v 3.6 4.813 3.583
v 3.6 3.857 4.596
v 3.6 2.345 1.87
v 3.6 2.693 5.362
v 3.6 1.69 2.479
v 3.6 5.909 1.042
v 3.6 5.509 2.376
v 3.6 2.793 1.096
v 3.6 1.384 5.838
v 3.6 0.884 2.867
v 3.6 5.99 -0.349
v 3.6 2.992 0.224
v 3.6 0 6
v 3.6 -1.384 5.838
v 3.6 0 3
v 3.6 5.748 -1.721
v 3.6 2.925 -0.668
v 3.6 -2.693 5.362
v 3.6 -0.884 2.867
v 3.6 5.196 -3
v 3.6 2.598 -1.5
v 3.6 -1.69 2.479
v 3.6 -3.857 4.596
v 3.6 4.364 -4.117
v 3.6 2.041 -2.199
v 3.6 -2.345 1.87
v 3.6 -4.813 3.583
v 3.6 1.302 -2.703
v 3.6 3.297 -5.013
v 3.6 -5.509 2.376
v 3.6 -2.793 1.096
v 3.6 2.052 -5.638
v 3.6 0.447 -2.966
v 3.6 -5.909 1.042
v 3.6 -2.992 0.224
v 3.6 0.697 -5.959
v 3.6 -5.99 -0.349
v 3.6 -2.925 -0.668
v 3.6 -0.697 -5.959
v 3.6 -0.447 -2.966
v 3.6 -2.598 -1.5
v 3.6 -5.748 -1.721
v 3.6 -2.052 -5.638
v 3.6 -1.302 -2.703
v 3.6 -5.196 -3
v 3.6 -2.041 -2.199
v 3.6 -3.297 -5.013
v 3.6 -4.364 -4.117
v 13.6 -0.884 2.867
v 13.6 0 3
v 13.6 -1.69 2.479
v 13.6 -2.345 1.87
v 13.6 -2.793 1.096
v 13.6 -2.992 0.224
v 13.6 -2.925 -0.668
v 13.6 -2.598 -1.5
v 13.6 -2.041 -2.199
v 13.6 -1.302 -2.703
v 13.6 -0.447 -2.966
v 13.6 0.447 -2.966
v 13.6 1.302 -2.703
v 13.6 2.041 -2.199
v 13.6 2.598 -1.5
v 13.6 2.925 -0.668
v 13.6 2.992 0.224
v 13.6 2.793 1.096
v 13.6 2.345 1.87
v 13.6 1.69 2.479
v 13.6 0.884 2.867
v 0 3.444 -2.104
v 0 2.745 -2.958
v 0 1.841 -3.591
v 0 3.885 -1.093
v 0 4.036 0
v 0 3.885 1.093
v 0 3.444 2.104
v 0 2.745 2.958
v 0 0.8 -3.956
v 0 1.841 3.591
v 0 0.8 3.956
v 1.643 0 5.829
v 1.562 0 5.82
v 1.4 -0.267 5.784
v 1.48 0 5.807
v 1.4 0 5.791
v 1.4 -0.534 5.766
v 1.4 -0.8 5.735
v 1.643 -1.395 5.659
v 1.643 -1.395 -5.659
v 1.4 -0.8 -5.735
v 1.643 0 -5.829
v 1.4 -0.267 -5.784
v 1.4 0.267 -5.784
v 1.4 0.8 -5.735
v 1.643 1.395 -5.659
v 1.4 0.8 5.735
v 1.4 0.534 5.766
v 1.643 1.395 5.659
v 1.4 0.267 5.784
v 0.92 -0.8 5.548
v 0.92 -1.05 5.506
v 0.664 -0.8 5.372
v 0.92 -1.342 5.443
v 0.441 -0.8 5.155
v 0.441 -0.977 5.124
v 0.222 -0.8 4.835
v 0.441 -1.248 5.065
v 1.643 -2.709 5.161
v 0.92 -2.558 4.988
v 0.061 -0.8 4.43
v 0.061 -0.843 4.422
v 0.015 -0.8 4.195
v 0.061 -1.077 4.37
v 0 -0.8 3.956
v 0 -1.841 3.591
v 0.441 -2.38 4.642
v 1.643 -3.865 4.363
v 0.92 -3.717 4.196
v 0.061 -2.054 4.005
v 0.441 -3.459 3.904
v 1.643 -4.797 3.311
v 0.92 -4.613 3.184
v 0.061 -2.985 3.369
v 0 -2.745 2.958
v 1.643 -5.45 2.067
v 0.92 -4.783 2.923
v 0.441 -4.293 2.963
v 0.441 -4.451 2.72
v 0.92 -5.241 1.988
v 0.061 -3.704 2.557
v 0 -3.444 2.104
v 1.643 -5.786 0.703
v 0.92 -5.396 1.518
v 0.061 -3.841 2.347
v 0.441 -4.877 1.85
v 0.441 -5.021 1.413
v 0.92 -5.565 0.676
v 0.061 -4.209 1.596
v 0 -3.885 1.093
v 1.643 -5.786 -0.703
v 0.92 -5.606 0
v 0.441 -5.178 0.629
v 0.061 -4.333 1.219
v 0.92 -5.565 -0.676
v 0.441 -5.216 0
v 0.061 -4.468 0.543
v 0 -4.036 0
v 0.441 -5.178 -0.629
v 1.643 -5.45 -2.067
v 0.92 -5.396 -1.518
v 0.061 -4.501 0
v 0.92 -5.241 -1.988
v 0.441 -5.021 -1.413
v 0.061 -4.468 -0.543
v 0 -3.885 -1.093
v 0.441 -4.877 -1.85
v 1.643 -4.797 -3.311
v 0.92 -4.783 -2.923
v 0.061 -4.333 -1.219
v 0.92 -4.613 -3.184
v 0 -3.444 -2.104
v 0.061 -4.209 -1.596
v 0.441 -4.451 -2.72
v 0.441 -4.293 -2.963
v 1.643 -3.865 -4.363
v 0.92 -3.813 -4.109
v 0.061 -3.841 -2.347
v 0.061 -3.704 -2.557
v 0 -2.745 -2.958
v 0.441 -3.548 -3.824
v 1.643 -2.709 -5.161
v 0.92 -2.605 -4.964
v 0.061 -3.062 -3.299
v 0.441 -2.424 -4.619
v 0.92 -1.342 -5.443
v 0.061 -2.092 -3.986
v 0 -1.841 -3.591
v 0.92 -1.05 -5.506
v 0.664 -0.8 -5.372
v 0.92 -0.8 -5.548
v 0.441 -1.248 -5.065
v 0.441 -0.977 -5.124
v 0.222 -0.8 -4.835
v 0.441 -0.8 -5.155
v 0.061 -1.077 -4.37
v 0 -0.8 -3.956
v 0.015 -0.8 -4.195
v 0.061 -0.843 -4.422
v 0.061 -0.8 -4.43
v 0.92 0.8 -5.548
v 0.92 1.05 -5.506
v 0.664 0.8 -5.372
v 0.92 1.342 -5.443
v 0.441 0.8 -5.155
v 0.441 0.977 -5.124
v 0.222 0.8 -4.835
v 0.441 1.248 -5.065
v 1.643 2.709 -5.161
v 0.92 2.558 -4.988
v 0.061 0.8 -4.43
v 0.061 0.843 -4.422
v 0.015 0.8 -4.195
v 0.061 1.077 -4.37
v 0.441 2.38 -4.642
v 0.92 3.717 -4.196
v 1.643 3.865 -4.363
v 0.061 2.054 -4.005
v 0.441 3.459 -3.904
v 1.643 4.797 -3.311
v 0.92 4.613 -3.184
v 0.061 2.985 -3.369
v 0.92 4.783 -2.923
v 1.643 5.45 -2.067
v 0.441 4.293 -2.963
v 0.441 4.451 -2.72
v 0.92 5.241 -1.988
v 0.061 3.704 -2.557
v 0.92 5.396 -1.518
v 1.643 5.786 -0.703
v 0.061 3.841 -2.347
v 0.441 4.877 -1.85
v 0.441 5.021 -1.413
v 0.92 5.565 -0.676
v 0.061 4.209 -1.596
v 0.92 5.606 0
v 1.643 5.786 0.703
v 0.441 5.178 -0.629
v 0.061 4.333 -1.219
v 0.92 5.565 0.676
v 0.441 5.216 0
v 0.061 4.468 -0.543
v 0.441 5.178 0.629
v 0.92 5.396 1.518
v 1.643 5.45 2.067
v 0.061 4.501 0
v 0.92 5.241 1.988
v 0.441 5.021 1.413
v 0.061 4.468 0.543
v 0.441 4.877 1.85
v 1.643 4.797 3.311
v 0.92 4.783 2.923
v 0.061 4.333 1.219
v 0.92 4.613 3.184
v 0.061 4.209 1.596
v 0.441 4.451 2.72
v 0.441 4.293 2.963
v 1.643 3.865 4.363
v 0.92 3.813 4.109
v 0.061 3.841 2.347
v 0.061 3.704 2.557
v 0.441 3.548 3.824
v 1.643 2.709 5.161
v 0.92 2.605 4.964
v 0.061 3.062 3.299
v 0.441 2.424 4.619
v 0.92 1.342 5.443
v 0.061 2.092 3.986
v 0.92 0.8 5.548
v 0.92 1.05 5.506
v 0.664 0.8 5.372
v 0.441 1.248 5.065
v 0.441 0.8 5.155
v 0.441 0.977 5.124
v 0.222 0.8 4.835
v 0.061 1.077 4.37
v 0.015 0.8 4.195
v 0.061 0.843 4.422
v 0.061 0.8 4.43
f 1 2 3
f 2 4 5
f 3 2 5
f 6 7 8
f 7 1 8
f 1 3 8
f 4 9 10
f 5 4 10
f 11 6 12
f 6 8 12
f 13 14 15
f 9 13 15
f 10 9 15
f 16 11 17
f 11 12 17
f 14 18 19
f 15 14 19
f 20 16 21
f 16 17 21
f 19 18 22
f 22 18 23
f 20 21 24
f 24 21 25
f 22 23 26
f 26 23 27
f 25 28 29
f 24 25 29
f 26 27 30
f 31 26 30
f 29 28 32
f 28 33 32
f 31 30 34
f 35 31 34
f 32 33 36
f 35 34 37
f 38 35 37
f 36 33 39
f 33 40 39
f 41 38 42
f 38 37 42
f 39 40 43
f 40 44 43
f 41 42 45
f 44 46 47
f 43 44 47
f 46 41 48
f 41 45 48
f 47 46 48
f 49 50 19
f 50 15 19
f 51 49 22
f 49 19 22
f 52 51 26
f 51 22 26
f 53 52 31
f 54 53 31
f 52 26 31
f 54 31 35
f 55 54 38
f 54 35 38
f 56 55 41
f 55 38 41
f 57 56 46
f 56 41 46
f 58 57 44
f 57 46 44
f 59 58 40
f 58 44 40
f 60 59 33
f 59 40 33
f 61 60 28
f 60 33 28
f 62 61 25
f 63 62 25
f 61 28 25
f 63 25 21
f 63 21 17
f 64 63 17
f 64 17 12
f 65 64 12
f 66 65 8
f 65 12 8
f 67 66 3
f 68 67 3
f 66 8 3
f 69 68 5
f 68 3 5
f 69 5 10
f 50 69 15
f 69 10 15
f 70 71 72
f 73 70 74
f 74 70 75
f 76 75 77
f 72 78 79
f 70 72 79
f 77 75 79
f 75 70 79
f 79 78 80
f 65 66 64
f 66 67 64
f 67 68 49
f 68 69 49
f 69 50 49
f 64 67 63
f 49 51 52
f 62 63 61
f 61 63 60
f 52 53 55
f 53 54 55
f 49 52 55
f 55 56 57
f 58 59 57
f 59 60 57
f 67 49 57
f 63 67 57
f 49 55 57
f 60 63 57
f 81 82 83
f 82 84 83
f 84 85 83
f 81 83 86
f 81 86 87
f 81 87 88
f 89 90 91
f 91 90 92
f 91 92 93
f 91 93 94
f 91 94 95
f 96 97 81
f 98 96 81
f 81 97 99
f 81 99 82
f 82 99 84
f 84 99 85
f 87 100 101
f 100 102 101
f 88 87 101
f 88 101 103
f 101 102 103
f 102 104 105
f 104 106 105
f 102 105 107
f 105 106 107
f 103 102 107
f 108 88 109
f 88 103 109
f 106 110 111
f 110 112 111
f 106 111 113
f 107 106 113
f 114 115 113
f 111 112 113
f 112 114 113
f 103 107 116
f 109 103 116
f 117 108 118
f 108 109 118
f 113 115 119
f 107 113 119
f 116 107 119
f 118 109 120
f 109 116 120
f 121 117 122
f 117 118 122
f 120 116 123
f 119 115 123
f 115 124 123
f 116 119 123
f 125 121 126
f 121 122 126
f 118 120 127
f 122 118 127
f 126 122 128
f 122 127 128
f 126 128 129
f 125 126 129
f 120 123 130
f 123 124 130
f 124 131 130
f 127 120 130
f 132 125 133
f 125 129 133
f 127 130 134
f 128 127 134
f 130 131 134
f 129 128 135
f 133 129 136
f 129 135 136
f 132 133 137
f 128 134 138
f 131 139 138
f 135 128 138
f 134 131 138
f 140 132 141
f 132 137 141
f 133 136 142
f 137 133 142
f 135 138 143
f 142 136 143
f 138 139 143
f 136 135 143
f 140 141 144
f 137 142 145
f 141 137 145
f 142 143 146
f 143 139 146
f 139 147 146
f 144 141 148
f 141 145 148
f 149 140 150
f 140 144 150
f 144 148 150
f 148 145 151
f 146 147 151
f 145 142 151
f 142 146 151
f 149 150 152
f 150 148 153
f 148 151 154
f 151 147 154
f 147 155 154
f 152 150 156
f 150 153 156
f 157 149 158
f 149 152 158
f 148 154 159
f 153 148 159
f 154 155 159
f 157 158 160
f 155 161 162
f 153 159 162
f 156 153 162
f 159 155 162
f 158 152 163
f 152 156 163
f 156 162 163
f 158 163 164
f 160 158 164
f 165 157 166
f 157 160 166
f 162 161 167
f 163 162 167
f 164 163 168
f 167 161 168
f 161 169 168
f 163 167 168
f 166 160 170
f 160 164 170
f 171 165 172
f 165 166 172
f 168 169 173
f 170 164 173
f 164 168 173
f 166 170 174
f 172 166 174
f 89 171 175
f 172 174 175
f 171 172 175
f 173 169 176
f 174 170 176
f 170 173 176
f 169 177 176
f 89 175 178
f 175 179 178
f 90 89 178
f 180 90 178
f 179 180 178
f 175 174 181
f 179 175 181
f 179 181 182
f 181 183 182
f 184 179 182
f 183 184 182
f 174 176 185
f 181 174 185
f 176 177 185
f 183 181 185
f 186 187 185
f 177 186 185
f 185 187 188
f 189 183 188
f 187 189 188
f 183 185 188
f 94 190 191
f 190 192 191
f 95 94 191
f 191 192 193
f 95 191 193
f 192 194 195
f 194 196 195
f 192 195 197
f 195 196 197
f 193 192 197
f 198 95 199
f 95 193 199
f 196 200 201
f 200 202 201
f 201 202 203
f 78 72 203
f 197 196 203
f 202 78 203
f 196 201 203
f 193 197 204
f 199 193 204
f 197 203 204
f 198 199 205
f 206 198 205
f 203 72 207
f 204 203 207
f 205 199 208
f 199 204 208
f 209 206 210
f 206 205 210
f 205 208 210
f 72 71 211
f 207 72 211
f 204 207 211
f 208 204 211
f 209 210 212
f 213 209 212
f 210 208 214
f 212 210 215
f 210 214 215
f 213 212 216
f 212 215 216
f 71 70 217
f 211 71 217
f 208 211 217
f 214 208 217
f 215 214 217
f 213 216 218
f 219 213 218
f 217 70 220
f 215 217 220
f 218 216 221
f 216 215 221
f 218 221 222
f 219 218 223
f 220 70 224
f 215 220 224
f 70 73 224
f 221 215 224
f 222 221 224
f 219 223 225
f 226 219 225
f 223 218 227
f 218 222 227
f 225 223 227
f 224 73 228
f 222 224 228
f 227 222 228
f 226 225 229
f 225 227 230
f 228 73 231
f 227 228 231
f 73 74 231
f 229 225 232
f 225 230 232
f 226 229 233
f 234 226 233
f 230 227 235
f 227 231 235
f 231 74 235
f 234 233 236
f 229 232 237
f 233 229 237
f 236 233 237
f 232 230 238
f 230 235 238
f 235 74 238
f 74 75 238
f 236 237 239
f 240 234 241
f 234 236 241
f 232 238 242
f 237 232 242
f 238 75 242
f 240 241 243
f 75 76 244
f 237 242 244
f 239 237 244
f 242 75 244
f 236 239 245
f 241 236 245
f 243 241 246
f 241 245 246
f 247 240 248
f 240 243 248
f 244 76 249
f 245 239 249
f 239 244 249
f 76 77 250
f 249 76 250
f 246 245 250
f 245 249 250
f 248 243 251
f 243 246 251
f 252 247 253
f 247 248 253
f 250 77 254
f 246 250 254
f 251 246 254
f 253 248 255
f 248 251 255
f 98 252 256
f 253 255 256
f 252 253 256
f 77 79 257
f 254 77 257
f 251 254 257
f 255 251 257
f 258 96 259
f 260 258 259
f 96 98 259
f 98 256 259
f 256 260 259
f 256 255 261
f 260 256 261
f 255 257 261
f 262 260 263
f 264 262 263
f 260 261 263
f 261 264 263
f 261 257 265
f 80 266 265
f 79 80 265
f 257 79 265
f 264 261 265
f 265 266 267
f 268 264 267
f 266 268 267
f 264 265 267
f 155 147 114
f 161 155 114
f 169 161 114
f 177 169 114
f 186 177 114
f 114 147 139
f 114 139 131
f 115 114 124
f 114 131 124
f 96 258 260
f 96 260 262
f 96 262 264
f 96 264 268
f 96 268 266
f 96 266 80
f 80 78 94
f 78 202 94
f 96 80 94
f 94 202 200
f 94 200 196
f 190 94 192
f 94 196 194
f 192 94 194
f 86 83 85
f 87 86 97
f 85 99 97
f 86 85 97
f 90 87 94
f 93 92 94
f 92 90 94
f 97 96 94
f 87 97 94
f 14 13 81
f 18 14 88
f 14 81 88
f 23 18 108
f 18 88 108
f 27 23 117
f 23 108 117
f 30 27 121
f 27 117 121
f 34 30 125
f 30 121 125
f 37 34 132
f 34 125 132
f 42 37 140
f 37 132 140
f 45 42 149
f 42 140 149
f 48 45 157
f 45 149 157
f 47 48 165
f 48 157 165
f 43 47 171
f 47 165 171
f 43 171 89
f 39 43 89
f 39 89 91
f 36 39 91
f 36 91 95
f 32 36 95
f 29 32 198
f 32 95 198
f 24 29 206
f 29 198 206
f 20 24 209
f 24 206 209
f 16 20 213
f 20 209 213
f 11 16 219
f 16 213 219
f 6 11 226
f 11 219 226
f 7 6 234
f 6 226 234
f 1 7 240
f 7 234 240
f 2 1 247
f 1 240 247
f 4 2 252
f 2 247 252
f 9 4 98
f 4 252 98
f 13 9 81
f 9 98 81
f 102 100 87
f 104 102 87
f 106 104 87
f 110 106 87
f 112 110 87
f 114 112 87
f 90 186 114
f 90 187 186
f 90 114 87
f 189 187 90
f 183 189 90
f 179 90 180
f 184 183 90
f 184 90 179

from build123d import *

# Parameters (mm, degrees)
FILLET2_R  = 1.8
SKETCH2_W  = 12
SKETCH2_H  = 1.6
SLOT_DEPTH = 1.4


with BuildPart() as part:
    # BodySke → Base-Revolve (revolve)
    with BuildSketch(Plane.XY, mode=Mode.PRIVATE) as base_revolve_sk:
        Polygon((3.6, 3), (3.6, 6), (0, 5.685040811), (0, 0), (13.6, 0), (13.6, 3), align=None)
    revolve(base_revolve_sk.sketch.rotate(Axis((-25.4, 0, 0), (1, 0, 0)), 90), axis=Axis((-25.4, 0, 0), (1, 0, 0)))  # turned: the seam where the file's is

    # Fillet2
    fillet2_edges = [part.edges().sort_by_distance(p)[0] for p in [
        (0, 0, -5.685040811),
    ]]
    fillet(fillet2_edges, radius=FILLET2_R)

    # Sketch2 → Slot (cut)
    with BuildSketch(Plane(origin=(0, 0, 0), x_dir=(0, 0, -1), z_dir=(1, 0, 0))):
        Rectangle(SKETCH2_W, SKETCH2_H)
    extrude(amount=SLOT_DEPTH, mode=Mode.SUBTRACT)


solid = part.part
